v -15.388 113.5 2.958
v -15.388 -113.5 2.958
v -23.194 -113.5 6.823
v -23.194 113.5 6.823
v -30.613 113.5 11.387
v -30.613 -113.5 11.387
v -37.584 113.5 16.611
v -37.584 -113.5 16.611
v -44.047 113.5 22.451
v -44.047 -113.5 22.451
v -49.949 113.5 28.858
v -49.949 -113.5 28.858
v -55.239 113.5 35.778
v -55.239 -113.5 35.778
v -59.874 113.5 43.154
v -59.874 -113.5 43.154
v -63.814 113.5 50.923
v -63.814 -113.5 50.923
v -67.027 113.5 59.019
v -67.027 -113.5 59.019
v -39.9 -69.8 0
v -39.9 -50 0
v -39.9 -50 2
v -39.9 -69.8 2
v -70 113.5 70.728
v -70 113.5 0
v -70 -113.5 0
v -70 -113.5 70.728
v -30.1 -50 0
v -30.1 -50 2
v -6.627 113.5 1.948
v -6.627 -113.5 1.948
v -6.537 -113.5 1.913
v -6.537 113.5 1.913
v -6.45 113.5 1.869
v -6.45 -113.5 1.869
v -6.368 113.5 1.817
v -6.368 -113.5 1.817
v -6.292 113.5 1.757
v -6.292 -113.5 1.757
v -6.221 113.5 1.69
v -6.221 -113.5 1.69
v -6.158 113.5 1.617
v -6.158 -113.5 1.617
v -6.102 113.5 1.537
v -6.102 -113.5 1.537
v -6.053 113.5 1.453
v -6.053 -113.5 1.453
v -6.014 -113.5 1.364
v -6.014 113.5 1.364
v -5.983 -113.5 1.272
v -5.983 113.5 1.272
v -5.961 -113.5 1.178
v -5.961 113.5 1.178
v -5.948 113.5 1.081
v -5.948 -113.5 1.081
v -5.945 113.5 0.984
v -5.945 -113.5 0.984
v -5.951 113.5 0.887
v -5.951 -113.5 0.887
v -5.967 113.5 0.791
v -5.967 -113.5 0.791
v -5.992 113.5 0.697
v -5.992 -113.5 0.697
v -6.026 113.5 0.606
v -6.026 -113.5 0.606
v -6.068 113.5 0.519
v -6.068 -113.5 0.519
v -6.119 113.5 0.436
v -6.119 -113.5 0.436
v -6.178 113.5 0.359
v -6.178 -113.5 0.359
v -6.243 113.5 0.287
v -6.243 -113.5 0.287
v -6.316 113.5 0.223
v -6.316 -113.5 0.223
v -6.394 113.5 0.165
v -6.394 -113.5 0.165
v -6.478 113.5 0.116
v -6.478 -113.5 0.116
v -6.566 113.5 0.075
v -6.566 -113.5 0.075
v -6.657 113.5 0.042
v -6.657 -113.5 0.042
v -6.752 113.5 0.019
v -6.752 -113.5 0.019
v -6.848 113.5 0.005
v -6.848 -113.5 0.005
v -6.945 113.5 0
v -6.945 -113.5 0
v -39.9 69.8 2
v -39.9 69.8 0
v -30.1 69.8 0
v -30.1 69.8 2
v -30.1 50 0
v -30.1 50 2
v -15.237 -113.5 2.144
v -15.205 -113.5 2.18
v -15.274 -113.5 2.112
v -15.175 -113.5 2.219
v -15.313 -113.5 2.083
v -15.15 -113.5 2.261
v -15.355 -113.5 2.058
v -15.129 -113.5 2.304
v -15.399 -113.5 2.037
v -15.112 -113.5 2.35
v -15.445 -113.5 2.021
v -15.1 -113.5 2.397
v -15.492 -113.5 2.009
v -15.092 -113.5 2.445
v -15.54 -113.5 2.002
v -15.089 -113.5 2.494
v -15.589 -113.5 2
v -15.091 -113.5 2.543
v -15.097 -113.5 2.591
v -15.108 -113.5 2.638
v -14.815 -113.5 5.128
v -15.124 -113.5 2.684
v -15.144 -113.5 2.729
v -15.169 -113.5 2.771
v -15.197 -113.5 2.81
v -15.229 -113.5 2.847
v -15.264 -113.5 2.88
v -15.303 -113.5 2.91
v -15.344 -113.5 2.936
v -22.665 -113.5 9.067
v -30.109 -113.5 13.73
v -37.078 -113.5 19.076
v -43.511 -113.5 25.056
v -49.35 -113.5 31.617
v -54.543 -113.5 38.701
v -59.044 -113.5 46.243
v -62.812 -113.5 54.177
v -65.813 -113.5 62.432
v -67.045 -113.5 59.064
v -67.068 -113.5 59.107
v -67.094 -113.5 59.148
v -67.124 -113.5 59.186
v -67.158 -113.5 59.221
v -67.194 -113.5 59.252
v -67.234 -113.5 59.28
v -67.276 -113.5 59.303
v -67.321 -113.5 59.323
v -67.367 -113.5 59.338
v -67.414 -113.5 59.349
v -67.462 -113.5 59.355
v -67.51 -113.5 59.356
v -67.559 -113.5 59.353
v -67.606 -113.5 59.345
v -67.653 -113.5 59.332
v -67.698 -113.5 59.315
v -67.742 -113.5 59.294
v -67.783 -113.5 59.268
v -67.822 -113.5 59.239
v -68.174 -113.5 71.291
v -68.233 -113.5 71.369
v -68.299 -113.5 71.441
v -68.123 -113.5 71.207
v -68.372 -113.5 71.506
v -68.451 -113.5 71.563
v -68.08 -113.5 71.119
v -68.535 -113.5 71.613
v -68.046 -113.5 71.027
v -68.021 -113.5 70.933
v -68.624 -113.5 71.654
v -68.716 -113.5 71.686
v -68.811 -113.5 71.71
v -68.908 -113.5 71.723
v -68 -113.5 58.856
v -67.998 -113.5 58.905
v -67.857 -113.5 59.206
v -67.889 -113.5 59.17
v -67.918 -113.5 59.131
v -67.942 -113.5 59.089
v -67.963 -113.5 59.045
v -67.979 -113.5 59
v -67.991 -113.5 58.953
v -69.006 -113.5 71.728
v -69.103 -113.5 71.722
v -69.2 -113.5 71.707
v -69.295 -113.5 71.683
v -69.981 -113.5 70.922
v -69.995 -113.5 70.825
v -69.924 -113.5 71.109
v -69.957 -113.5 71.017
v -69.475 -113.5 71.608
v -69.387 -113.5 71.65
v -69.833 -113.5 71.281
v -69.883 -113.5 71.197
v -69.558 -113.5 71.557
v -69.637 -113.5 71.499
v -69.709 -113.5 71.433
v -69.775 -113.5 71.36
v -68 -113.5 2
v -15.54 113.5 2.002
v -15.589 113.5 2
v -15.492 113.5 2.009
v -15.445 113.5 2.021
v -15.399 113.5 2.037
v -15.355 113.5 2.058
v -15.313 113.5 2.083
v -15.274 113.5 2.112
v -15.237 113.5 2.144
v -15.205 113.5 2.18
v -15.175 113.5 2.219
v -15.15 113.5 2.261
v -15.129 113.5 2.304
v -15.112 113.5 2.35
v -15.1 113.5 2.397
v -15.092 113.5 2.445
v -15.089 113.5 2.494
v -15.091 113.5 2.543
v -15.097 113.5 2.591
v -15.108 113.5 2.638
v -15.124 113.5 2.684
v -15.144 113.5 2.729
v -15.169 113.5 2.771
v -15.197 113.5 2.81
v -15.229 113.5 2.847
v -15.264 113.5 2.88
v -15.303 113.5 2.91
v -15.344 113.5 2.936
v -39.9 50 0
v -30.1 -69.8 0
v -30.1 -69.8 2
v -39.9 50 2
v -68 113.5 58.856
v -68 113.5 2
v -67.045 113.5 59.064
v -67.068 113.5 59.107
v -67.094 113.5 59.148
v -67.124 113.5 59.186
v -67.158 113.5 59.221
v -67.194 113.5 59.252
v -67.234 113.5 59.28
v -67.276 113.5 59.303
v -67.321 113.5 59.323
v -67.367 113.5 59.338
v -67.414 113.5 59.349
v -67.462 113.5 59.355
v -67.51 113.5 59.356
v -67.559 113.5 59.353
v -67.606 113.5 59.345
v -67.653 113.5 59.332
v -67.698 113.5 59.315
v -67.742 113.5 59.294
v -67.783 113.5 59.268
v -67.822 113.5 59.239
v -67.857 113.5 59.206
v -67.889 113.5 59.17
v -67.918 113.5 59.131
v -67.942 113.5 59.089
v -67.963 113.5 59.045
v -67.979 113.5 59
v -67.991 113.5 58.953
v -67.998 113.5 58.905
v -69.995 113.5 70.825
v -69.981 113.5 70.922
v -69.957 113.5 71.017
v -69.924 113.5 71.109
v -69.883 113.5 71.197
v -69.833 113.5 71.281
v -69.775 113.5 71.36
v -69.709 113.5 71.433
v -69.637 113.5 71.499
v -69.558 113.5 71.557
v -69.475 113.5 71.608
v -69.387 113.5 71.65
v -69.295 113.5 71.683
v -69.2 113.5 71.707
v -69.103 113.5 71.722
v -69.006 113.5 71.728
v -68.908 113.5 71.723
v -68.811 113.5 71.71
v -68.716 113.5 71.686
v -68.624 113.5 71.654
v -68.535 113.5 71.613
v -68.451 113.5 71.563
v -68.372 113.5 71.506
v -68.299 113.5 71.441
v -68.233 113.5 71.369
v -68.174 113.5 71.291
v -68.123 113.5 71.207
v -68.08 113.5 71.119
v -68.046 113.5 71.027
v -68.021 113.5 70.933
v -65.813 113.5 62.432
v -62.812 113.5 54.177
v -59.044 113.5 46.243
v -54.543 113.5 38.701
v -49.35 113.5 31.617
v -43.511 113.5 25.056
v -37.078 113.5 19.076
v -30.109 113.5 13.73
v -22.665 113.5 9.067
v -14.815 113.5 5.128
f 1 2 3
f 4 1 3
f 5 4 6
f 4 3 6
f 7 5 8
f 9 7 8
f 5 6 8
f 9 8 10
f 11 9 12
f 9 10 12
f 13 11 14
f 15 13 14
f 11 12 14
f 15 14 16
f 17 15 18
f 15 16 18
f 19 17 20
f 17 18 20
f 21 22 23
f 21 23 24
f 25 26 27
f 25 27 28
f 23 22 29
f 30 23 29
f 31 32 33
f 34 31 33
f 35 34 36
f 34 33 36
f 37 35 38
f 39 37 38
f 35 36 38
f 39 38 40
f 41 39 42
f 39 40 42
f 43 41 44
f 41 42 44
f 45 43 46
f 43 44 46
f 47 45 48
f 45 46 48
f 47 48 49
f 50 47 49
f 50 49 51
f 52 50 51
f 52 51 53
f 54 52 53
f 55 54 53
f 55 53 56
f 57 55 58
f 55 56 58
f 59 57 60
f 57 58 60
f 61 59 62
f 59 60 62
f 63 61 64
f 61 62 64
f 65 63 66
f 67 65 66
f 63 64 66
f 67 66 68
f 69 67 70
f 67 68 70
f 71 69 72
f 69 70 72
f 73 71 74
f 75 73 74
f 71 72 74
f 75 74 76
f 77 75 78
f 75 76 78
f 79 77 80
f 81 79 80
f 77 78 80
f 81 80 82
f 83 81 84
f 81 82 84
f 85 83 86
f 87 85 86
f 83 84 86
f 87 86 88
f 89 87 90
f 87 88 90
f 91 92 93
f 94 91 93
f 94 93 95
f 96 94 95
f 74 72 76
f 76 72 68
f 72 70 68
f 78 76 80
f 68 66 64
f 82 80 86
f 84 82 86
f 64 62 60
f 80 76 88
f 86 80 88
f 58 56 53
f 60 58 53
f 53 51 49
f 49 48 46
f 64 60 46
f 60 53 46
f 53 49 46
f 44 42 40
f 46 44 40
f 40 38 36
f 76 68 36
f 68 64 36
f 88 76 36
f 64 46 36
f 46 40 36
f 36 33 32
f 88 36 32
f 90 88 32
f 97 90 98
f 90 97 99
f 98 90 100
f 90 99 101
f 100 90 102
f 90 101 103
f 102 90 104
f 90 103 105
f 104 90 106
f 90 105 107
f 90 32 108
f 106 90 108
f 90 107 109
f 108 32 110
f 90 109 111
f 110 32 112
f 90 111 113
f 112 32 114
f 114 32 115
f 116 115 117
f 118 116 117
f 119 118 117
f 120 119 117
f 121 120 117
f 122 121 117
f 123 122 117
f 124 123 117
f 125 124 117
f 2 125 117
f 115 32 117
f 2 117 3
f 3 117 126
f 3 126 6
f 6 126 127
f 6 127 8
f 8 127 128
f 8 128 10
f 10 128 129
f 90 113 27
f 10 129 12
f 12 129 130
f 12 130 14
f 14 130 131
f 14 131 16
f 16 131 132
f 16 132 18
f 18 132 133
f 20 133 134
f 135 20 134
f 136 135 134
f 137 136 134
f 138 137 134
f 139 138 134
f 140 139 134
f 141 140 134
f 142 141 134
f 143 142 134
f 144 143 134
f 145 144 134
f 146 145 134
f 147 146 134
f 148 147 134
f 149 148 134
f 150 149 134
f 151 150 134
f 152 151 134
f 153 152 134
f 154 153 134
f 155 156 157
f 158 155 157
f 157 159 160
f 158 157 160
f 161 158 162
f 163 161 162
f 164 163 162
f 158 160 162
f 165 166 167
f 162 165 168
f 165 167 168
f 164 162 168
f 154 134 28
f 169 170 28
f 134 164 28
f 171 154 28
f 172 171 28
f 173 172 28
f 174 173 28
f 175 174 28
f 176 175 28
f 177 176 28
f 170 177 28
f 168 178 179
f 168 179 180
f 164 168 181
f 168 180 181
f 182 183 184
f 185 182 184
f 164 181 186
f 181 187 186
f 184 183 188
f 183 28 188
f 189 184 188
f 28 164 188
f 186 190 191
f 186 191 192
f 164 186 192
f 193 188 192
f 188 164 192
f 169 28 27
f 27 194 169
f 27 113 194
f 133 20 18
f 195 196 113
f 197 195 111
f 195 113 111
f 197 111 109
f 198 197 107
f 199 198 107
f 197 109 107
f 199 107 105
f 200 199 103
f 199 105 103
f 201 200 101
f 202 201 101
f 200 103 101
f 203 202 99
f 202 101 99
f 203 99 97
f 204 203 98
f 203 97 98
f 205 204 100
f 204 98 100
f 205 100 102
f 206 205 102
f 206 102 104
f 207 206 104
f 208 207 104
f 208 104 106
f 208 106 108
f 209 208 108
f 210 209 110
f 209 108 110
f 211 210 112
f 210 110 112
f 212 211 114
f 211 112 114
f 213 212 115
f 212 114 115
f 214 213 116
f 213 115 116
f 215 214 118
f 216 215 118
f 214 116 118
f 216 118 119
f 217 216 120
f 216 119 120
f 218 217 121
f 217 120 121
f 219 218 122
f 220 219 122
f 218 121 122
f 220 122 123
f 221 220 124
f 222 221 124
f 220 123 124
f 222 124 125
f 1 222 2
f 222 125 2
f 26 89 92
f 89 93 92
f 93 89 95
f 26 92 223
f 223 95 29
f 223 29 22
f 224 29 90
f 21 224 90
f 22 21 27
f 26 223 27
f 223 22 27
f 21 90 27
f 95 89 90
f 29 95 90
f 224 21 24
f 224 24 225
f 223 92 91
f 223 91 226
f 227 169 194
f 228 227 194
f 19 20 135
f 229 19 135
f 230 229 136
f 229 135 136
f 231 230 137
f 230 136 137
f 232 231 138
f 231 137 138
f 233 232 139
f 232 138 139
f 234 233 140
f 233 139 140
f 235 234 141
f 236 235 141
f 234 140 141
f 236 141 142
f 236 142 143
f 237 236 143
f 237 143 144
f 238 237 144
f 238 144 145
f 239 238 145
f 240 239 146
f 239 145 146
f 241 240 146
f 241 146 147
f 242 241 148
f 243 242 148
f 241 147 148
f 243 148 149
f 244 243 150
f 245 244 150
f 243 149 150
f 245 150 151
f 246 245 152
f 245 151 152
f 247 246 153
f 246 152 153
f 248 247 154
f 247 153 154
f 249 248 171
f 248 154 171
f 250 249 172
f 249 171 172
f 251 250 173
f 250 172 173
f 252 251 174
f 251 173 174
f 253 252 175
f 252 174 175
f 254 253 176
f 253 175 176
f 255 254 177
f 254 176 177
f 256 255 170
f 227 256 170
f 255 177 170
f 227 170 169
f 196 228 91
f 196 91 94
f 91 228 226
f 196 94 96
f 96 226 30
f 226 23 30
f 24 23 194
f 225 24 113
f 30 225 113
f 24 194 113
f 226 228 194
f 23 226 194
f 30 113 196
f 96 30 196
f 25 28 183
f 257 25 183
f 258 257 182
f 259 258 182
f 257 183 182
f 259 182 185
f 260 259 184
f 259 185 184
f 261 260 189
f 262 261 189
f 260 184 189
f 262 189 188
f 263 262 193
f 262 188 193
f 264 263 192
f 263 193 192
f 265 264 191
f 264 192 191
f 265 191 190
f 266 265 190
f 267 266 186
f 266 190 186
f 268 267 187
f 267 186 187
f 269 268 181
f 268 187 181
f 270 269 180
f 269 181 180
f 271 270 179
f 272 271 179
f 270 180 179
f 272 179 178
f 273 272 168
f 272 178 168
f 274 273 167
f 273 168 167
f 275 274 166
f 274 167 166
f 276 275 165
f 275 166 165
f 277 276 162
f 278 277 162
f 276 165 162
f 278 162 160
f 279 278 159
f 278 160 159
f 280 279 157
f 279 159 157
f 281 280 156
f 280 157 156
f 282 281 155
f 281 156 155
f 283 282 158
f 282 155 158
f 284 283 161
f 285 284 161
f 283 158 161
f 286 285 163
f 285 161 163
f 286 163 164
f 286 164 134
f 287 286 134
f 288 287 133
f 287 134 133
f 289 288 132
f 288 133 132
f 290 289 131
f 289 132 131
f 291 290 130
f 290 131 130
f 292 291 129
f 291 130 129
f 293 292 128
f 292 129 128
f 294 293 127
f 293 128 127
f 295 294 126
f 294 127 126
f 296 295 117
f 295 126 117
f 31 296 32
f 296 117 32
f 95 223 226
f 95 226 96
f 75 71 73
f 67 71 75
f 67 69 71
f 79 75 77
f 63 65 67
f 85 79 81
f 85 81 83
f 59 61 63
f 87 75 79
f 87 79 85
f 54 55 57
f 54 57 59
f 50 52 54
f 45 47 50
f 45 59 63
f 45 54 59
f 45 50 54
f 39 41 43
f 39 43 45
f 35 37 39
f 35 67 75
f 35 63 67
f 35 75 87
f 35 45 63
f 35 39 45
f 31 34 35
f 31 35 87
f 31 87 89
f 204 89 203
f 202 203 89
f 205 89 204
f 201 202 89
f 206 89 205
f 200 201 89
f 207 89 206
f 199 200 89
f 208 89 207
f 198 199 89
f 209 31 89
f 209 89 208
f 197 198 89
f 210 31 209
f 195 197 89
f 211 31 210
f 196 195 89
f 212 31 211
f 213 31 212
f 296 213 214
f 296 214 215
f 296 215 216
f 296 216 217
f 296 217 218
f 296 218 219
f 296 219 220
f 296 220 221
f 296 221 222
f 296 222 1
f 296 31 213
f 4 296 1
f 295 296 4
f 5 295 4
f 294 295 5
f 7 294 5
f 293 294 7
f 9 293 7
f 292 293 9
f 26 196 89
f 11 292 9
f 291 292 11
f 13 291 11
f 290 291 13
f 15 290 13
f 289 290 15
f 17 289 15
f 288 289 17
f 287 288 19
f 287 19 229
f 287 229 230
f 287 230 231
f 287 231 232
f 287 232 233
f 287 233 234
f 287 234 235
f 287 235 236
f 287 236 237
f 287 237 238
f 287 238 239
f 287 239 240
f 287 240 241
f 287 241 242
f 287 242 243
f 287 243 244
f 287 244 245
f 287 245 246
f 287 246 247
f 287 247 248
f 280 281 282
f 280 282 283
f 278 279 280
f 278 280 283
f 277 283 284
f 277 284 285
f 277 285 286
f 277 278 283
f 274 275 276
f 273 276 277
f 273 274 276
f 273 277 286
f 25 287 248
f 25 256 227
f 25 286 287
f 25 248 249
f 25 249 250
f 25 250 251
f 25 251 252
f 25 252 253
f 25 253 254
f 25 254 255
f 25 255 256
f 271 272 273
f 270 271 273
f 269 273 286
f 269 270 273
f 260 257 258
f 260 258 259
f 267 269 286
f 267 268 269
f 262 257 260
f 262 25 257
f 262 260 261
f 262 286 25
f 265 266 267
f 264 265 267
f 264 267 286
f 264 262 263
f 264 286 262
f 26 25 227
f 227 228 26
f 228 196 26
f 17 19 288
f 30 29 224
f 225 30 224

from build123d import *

# Parameters (mm, degrees)
BOSS_EXTRUDE1_DEPTH      = 113.5
BOSS_EXTRUDE1_DEPTH_BACK = 113.5
SKETCH3_W                = 9.8
SKETCH3_H                = 19.8
CUT_EXTRUDE1_DEPTH       = 5


with BuildPart() as part:
    # Sketch2 → Boss-Extrude1 (new, two sides: drawn at the far end of the back side and taken through both)
    with BuildSketch(Plane(origin=(0, 0, 0), x_dir=(-1, 0, 0), z_dir=(0, 1, 0)).offset(-BOSS_EXTRUDE1_DEPTH_BACK)):
        with BuildLine():
            Line((6.944925281, 0), (70, 0))
            Line((70, 0), (70, 70.727517767))
            ThreePointArc((70, 70.727517767), (69.10322059, 71.722176256), (68.02130898, 70.932856238))
            ThreePointArc((68.02130898, 70.932856238), (46.50806151, 28.267371652), (6.627399441, 1.948249619))
            ThreePointArc((6.627399441, 1.948249619), (5.957947667, 0.839142329), (6.944925281, 0))
        make_face()
        with BuildLine():
            Line((68, 58.856286255), (68, 2))
            Line((68, 2), (15.588847456, 2))
            ThreePointArc((15.588847456, 2), (15.099520976, 2.397240103), (15.387714901, 2.957761614))
            ThreePointArc((15.387714901, 2.957761614), (47.071395865, 25.58711402), (67.027291068, 59.019216502))
            ThreePointArc((67.027291068, 59.019216502), (67.582600042, 59.349416291), (68, 58.856286255))
        make_face(mode=Mode.SUBTRACT)
    extrude(amount=BOSS_EXTRUDE1_DEPTH + BOSS_EXTRUDE1_DEPTH_BACK)

    # Sketch3 → Cut-Extrude1 (cut)
    with BuildSketch(Plane(origin=(0, 0, 0), x_dir=(1, 0, 0), z_dir=(0, 0, -1))):
        with Locations((-35, -59.9)):
            Rectangle(SKETCH3_W, SKETCH3_H)
        with Locations((-35, 59.9)):
            Rectangle(SKETCH3_W, SKETCH3_H)
    extrude(amount=-CUT_EXTRUDE1_DEPTH, mode=Mode.SUBTRACT)


solid = part.part
